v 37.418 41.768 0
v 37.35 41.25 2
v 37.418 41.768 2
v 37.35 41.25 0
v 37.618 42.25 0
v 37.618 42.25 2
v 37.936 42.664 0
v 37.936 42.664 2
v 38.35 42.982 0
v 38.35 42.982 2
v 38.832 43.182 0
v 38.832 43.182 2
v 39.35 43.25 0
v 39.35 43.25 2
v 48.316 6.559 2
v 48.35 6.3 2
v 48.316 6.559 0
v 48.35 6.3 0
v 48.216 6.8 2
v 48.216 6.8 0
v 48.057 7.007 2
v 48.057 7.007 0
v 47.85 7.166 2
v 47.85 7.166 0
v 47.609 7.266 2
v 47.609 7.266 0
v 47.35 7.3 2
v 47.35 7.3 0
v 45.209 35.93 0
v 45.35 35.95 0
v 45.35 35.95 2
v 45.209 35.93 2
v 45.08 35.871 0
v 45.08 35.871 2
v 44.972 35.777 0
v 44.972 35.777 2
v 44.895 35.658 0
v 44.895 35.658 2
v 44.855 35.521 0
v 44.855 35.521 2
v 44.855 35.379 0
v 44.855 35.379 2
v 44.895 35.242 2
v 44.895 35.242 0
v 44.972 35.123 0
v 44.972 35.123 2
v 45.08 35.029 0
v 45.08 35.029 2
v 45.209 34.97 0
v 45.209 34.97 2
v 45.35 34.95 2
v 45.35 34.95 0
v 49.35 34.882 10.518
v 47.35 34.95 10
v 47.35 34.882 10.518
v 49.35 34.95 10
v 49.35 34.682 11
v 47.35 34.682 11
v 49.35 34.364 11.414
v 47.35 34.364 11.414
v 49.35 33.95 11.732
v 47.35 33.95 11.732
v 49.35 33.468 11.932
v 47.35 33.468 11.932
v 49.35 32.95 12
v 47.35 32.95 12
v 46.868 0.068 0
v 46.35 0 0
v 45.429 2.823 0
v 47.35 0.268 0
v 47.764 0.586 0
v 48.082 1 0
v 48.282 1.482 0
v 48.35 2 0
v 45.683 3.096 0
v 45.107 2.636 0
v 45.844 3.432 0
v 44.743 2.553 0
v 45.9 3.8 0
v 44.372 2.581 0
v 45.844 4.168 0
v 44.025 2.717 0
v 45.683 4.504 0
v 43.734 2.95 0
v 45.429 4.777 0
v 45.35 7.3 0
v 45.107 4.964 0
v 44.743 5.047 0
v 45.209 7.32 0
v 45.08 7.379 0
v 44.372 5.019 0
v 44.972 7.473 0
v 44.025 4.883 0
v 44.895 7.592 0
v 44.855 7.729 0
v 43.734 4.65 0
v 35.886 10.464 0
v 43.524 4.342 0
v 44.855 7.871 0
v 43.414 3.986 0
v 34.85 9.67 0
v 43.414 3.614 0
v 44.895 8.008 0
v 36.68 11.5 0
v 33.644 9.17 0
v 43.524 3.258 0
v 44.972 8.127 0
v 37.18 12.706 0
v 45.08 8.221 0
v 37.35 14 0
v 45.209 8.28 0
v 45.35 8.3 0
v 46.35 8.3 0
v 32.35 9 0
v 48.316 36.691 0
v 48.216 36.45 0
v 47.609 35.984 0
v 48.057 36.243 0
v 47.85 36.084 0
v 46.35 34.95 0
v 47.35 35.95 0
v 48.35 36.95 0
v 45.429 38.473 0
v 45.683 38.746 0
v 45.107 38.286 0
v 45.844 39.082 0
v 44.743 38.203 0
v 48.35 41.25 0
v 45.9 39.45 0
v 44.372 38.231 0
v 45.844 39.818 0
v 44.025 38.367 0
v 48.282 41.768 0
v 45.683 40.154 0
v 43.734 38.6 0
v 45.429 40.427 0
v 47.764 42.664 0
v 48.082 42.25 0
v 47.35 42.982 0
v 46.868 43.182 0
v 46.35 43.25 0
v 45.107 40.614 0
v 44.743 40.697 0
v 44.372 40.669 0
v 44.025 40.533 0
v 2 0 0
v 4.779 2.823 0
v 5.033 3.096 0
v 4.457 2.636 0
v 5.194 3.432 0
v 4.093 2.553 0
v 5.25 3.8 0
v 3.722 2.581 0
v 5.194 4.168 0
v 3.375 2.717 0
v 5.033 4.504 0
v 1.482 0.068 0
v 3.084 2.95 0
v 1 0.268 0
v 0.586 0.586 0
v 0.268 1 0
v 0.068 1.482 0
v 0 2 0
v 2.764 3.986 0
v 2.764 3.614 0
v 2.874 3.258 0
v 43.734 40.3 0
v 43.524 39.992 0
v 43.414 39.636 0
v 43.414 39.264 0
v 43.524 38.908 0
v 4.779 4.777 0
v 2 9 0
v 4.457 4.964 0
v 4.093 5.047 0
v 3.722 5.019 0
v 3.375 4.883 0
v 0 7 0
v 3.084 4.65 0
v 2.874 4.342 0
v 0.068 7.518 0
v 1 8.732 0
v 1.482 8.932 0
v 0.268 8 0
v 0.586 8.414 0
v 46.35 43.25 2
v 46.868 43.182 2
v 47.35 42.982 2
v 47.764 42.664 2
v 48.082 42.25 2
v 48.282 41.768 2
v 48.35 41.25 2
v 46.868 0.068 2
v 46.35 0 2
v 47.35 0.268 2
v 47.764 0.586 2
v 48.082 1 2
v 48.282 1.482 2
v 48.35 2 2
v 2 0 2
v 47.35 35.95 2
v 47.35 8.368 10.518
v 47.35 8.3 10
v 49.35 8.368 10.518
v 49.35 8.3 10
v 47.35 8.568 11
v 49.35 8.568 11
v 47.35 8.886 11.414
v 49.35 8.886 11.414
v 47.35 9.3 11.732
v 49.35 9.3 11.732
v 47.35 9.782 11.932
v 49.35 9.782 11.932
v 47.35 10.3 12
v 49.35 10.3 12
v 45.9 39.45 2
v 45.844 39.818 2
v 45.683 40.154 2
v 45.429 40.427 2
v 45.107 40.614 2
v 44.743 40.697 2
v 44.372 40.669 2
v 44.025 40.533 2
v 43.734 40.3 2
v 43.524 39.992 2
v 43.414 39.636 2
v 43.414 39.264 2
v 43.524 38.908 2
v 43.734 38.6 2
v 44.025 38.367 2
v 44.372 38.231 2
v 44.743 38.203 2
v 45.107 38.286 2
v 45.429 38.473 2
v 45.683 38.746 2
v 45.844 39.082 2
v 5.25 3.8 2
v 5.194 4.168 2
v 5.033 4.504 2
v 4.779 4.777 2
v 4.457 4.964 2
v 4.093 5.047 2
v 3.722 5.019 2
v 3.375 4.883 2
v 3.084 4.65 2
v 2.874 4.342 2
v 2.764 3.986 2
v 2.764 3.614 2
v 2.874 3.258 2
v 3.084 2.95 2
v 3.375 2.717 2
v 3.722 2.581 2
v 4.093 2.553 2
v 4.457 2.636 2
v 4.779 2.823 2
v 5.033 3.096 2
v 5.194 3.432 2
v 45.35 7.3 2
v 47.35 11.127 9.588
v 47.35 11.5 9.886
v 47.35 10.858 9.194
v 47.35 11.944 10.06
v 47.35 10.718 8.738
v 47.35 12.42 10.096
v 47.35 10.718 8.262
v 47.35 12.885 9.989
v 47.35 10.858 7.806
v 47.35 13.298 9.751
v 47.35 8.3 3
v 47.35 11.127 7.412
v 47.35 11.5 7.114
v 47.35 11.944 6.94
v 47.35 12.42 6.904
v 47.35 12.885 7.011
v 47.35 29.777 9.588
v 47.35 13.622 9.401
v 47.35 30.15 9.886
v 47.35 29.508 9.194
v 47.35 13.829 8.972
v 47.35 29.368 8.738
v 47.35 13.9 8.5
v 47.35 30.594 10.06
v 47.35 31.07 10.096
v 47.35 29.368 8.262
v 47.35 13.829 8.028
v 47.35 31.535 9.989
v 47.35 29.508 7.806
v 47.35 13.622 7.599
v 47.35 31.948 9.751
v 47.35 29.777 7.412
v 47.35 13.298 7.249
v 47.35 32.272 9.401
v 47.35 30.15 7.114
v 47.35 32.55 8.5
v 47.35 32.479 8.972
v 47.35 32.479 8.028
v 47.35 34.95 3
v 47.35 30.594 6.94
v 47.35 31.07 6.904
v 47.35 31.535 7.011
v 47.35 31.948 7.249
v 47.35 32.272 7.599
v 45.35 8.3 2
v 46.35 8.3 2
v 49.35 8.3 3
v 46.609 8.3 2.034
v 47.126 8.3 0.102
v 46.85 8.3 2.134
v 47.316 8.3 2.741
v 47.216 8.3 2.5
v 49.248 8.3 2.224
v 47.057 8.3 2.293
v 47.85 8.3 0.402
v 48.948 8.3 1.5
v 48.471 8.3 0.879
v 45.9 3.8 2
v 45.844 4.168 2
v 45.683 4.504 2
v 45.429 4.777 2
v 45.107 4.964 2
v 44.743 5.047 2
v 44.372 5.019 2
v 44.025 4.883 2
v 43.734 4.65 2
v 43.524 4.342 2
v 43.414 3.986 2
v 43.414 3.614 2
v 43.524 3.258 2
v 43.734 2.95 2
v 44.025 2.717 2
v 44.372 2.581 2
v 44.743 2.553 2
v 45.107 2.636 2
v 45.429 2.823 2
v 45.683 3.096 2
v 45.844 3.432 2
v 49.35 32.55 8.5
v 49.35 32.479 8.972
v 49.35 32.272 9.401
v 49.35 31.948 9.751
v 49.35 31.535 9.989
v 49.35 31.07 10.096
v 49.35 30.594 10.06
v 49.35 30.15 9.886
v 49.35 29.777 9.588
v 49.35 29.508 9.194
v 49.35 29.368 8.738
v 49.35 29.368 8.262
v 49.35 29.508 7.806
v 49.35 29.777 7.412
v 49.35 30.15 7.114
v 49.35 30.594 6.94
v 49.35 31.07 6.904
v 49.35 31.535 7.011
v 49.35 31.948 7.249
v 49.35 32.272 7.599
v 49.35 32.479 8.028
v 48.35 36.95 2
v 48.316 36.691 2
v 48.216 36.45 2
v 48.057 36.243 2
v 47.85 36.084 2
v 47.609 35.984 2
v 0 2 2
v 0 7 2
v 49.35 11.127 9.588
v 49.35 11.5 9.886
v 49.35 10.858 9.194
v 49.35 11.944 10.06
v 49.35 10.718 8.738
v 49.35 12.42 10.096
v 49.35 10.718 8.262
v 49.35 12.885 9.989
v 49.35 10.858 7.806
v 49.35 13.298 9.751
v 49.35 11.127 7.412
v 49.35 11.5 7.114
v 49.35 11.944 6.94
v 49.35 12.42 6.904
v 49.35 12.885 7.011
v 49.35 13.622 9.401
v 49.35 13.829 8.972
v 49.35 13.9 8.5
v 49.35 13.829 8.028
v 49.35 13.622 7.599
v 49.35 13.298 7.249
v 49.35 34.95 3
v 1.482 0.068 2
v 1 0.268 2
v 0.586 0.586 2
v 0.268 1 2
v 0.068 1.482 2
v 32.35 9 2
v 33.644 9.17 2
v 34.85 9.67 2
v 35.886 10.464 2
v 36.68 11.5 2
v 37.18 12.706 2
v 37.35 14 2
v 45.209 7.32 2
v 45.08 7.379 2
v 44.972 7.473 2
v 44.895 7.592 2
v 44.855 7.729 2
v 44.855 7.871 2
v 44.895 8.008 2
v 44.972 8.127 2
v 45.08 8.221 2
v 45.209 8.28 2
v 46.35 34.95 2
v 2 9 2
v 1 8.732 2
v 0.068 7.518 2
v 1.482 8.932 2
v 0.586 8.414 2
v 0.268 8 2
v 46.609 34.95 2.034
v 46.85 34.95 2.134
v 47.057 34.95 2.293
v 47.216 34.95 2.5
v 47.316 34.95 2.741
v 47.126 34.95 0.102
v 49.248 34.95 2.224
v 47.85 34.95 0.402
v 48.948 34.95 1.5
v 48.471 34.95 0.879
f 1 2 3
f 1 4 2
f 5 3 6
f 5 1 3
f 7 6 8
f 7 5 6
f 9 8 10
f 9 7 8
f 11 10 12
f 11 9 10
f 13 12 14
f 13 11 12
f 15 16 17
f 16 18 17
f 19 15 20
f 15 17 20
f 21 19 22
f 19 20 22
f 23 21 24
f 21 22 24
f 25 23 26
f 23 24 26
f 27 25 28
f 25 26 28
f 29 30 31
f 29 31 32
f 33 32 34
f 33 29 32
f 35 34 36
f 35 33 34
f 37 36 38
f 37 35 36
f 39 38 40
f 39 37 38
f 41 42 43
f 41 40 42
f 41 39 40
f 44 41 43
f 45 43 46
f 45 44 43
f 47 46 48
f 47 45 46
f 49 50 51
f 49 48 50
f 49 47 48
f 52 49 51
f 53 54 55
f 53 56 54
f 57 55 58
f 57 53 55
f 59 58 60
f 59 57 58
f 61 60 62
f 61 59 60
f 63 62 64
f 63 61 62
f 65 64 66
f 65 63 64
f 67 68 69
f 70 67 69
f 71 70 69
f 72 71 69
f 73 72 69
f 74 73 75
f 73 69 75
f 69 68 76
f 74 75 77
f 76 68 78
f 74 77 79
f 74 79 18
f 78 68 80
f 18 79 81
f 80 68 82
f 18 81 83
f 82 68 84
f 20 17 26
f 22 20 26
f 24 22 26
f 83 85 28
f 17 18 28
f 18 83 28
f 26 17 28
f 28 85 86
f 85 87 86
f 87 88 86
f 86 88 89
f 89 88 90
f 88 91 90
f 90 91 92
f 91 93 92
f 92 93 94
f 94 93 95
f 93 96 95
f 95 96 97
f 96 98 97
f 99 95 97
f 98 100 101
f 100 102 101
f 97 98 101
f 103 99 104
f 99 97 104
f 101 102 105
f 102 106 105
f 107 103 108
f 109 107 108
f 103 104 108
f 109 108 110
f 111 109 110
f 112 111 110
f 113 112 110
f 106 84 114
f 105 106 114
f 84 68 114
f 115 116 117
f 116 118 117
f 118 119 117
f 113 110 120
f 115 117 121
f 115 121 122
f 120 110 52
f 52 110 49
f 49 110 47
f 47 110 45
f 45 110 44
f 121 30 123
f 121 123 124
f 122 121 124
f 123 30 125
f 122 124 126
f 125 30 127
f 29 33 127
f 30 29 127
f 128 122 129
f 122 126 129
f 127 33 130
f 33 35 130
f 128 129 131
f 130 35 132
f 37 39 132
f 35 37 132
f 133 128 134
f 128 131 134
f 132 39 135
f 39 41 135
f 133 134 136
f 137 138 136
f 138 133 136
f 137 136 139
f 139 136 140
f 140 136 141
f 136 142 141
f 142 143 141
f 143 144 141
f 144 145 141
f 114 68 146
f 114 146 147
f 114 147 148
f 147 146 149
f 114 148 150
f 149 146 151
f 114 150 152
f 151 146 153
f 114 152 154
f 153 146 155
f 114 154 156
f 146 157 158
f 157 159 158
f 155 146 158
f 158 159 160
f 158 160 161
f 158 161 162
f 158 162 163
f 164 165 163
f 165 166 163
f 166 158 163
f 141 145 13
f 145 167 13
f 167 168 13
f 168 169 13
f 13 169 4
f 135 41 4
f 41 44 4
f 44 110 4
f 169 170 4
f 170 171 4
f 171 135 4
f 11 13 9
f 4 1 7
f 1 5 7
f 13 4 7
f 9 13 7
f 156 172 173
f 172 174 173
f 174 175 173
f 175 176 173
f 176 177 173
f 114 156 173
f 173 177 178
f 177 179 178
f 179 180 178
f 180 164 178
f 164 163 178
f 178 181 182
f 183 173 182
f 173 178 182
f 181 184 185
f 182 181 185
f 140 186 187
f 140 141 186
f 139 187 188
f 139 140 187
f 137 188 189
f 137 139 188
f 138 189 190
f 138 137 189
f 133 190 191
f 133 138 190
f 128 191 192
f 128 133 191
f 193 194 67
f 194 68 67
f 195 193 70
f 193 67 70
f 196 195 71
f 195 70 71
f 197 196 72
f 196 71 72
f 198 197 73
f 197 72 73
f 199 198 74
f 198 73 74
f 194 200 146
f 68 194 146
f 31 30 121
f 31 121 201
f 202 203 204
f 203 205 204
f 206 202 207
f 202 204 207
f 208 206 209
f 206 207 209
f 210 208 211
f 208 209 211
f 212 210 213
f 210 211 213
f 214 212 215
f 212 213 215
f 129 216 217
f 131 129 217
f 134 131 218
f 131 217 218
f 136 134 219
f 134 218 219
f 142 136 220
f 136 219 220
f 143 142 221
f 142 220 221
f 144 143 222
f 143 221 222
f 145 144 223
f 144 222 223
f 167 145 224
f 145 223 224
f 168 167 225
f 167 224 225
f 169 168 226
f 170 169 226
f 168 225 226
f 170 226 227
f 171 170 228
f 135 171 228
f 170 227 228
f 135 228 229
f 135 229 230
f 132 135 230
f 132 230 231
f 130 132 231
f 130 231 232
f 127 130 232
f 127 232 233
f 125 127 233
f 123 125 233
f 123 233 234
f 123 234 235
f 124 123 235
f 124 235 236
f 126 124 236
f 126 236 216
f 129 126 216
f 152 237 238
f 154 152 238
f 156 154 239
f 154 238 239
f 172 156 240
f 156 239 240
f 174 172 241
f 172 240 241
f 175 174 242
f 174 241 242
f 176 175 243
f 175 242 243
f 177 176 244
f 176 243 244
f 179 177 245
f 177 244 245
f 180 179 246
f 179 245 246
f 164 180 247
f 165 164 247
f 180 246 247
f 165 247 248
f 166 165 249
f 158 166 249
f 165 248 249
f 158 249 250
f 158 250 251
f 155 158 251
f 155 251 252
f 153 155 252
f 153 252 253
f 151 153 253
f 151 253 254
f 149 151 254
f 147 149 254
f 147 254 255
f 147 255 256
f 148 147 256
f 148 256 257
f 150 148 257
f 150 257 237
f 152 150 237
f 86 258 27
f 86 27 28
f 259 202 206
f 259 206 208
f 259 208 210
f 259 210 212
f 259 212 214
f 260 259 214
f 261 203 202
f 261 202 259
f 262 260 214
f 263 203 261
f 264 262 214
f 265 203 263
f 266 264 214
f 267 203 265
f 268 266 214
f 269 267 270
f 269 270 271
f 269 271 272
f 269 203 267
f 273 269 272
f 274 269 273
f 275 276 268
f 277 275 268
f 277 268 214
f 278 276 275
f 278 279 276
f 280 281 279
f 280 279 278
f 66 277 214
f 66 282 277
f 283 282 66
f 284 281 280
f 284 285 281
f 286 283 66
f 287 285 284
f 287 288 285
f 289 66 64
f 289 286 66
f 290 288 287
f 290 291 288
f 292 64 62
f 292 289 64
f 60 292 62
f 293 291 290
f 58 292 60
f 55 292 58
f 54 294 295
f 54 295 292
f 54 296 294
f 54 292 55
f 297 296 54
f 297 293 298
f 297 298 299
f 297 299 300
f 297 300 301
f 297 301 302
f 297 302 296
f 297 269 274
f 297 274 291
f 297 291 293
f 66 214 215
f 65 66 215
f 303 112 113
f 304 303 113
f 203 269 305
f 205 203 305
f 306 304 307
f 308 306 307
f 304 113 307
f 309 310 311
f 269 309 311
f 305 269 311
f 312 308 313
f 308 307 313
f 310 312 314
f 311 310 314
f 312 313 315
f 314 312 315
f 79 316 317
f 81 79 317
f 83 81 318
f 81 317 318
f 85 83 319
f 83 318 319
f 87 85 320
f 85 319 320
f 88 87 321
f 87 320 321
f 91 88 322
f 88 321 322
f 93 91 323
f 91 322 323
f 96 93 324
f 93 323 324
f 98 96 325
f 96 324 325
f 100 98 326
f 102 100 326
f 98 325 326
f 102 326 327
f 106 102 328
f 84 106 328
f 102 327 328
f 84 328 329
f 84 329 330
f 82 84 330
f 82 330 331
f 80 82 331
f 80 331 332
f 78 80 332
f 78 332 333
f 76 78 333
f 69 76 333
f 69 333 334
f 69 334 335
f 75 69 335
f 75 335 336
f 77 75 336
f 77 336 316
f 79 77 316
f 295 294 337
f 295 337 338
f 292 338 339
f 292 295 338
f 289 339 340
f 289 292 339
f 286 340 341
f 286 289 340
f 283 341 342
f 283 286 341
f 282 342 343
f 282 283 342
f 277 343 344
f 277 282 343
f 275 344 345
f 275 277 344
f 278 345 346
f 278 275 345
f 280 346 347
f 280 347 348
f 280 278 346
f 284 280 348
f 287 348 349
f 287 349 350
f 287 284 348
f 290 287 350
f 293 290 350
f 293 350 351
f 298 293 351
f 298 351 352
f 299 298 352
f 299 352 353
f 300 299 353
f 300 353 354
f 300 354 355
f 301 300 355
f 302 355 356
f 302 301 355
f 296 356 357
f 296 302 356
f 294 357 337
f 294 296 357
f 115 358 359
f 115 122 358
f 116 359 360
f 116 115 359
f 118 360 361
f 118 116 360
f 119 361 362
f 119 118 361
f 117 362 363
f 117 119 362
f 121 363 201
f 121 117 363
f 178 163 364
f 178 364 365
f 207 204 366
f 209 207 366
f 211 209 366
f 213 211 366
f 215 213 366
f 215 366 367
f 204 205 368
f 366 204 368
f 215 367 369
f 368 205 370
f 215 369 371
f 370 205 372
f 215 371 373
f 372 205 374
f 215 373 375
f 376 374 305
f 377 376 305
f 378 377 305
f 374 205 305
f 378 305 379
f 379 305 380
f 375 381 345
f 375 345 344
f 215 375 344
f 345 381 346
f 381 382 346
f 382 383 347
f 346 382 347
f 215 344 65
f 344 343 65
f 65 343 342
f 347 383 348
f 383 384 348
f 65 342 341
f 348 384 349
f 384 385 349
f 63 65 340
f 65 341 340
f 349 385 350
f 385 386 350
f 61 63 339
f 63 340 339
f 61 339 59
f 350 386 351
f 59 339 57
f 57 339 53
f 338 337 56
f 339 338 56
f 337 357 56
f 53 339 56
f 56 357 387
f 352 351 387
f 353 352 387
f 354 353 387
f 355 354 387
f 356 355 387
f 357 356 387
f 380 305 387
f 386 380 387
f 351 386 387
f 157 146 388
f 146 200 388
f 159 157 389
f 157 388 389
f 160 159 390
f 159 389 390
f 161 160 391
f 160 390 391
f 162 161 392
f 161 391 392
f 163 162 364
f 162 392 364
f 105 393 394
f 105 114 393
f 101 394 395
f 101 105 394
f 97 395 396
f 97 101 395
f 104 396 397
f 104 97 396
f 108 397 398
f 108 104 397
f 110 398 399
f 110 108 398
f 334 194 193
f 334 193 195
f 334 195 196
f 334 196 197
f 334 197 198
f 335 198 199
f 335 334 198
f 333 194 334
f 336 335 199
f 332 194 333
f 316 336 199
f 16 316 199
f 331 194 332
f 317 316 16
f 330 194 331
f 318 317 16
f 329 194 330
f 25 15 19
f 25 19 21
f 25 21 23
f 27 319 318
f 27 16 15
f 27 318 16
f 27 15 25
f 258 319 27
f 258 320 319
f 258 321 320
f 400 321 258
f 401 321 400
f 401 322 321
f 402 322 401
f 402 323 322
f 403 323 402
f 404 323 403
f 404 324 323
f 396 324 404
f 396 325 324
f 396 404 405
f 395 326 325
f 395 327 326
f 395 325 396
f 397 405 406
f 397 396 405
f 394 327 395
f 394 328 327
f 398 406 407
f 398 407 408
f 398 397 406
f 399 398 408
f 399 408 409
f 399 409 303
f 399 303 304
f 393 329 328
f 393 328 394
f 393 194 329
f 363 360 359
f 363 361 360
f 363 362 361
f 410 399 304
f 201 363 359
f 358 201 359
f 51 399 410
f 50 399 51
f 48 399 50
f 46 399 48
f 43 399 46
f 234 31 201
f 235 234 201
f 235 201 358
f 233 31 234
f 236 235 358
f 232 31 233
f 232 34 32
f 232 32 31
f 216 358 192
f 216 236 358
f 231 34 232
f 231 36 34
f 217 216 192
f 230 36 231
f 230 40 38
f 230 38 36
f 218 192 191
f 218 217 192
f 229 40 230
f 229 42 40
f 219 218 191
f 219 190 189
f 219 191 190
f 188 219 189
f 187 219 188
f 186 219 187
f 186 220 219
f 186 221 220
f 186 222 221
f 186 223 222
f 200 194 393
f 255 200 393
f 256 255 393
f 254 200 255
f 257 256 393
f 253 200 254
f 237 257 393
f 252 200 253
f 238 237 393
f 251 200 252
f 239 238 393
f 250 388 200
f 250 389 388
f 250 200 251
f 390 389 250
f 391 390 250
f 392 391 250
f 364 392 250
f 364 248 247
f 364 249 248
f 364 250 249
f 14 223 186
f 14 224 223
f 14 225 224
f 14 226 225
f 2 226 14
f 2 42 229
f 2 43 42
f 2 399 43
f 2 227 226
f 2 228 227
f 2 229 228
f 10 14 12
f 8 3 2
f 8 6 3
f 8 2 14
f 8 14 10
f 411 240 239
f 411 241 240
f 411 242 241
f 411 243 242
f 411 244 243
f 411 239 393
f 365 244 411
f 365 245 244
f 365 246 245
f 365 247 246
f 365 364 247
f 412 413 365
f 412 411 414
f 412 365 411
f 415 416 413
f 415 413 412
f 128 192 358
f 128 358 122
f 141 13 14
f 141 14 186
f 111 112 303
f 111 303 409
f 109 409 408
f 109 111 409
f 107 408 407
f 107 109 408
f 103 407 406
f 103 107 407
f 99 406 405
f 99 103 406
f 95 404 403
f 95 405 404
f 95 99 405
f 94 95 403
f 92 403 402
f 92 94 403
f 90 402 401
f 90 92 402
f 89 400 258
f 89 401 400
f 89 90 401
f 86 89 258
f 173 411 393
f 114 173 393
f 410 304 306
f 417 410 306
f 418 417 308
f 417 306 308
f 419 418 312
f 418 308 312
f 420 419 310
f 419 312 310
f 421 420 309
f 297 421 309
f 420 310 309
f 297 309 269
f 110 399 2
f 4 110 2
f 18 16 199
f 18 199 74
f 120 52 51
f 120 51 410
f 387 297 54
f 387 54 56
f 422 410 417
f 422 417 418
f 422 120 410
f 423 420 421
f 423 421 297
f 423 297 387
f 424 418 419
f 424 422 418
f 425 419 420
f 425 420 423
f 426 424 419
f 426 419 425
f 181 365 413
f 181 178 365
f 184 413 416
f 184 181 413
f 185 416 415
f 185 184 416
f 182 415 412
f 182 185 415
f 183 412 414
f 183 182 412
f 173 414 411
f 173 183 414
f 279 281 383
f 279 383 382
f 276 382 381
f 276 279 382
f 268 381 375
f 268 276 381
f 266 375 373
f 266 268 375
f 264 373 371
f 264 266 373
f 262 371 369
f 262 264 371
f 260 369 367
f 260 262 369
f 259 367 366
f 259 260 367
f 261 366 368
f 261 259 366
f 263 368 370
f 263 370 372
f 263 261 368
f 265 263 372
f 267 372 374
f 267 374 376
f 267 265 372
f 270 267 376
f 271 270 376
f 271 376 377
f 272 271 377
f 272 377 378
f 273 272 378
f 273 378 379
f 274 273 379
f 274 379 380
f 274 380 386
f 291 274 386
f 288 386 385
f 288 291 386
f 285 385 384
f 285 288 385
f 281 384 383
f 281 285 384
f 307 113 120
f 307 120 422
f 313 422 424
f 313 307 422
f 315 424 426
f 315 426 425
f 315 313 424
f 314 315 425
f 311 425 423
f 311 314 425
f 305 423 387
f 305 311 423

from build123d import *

# Parameters (mm, degrees)
SKETCH1_W                 = 47.35
SKETCH1_H                 = 43.25
BOSS_EXTRUDE2_DEPTH       = 2
EDGE_FLANGE1_START        = -2
EDGE_FLANGE1_OUTLINE_W    = 1
EDGE_FLANGE1_OUTLINE_H    = 2
EDGE_FLANGE1_DEPTH        = 2
EDGE_FLANGE1_START_2      = -1
EDGE_FLANGE1_2_DEPTH      = 3.69178
EDGE_FLANGE1_3_OUTLINE_W  = 2
EDGE_FLANGE1_3_OUTLINE_H  = 26.65
EDGE_FLANGE1_3_DEPTH      = 12
EDGE_FLANGE1_START_3      = 8.3
EDGE_FLANGE1_4_DEPTH      = 26.65
EDGE_FLANGE1_5_DEPTH      = 26.65
EDGE_FLANGE1_START_4      = 47.35
EDGE_FLANGE1_6_OUTLINE_R  = 1.6
EDGE_FLANGE1_6_DEPTH      = 2
REDONDEO1_R               = 2
TALADRO_ROSCADO_M31_D     = 2.5
TALADRO_ROSCADO_M31_DEPTH = 8.5
TALADRO_ROSCADO_M31_TIP   = 0.751075774
CROQUIS4_W                = 37.35
CROQUIS4_H                = 34.25
CORTAR_EXTRUIR1_DEPTH     = 67.377594111
CROQUIS14_W               = 2
CROQUIS14_H               = 7.3
SALIENTE_EXTRUIR1_DEPTH   = 1
FILLET1_R                 = 2
REDONDEO2_R               = 5
REDONDEO3_R               = 1


with BuildPart() as part:
    # Sketch1 → Boss-Extrude2 (new body)
    with BuildSketch(Plane.XY):
        with Locations((23.675, 21.625)):
            Rectangle(SKETCH1_W, SKETCH1_H)
    extrude(amount=BOSS_EXTRUDE2_DEPTH)

    # Edge-Flange1: read off the stored shape, not the designer's step
    # Edge-Flange1 outline → Edge-Flange1 (cut)
    with BuildSketch(Plane(origin=(47.35, 0, 2), x_dir=(0, 1, 0), z_dir=(1, 0, 0)).offset(EDGE_FLANGE1_START)):
        with Locations((35.45, -1)):
            Rectangle(EDGE_FLANGE1_OUTLINE_W, EDGE_FLANGE1_OUTLINE_H)
        with Locations((7.8, -1)):
            Rectangle(EDGE_FLANGE1_OUTLINE_W, EDGE_FLANGE1_OUTLINE_H)
    extrude(amount=EDGE_FLANGE1_DEPTH, mode=Mode.SUBTRACT)

    # Edge-Flange1 2 outline → Edge-Flange1 2 (cut)
    with BuildSketch(Plane.XY.offset(EDGE_FLANGE1_START_2)):
        with BuildLine():
            ThreePointArc((45.35, 35.95), (44.85, 35.45), (45.35, 34.95))
            Line((45.35, 34.95), (45.35, 35.95))
        make_face()
        with BuildLine():
            ThreePointArc((45.35, 8.3), (44.85, 7.8), (45.35, 7.3))
            Line((45.35, 7.3), (45.35, 8.3))
        make_face()
    extrude(amount=EDGE_FLANGE1_2_DEPTH, mode=Mode.SUBTRACT)

    # Edge-Flange1 3 outline → Edge-Flange1 3 (add)
    with BuildSketch(Plane.XY):
        with Locations((48.35, 21.625)):
            Rectangle(EDGE_FLANGE1_3_OUTLINE_W, EDGE_FLANGE1_3_OUTLINE_H)
    extrude(amount=EDGE_FLANGE1_3_DEPTH)

    # Edge-Flange1 4 outline → Edge-Flange1 4 (add)
    with BuildSketch(Plane(origin=(0, 0, 0), x_dir=(1, 0, 0), z_dir=(0, 1, 0)).offset(EDGE_FLANGE1_START_3)):
        with BuildLine():
            ThreePointArc((46.35, -2), (47.057106781, -2.292893219), (47.35, -3))
            Line((47.35, -3), (47.35, -2))
            Line((47.35, -2), (46.35, -2))
        make_face()
    extrude(amount=EDGE_FLANGE1_4_DEPTH)

    # Edge-Flange1 5 outline → Edge-Flange1 5 (cut)
    with BuildSketch(Plane(origin=(0, 0, 0), x_dir=(1, 0, 0), z_dir=(0, 1, 0)).offset(EDGE_FLANGE1_START_3)):
        with BuildLine():
            ThreePointArc((46.35, 0), (48.471320344, -0.878679656), (49.35, -3))
            Line((49.35, -3), (49.35, 0))
            Line((49.35, 0), (46.35, 0))
        make_face()
    extrude(amount=EDGE_FLANGE1_5_DEPTH, mode=Mode.SUBTRACT)

    # Edge-Flange1 6 outline → Edge-Flange1 6 (cut)
    with BuildSketch(Plane.YZ.offset(EDGE_FLANGE1_START_4)):
        with Locations((12.3, 8.5)):
            Circle(EDGE_FLANGE1_6_OUTLINE_R)
        with Locations((30.95, 8.5)):
            Circle(EDGE_FLANGE1_6_OUTLINE_R)
    extrude(amount=EDGE_FLANGE1_6_DEPTH, mode=Mode.SUBTRACT)

    # Redondeo1
    redondeo1_edges = [part.edges().sort_by_distance(p)[0] for p in [
        (48.35, 8.3, 12),
        (48.35, 34.95, 12),
    ]]
    fillet(redondeo1_edges, radius=REDONDEO1_R)

    # Taladro roscado M31
    with Locations(Plane(origin=(0, 0, 0), x_dir=(-1, 0, 0), z_dir=(0, 0, -1))):
        with Locations((-44.65, 39.45), (-4, 3.8), (-44.65, 3.8)):
            Hole(TALADRO_ROSCADO_M31_D / 2, depth=TALADRO_ROSCADO_M31_DEPTH)
            with Locations((0, 0, -(TALADRO_ROSCADO_M31_DEPTH + TALADRO_ROSCADO_M31_TIP / 2))):  # 118° drill point
                Cone(0, TALADRO_ROSCADO_M31_D / 2, TALADRO_ROSCADO_M31_TIP, mode=Mode.SUBTRACT)

    # Croquis4 → Cortar-Extruir1 (cut, through all)
    with BuildSketch(Plane.XY.offset(2)):
        with Locations((18.675, 26.125)):
            Rectangle(CROQUIS4_W, CROQUIS4_H)
    extrude(amount=-CORTAR_EXTRUIR1_DEPTH, mode=Mode.SUBTRACT)

    # Croquis14 → Saliente-Extruir1 (add)
    with BuildSketch(Plane(origin=(47.35, 0, 0), x_dir=(0, 0, -1), z_dir=(1, 0, 0))):
        with Locations((-1, 3.65)):
            Rectangle(CROQUIS14_W, CROQUIS14_H)
        with Locations((-1, 39.6)):
            Rectangle(CROQUIS14_W, CROQUIS14_H)
    extrude(amount=SALIENTE_EXTRUIR1_DEPTH)

    # Fillet1
    fillet1_edges = [part.edges().sort_by_distance(p)[0] for p in [
        (0, 9, 1),
        (37.35, 43.25, 1),
        (48.35, 0, 1),
        (48.35, 43.25, 1),
        (0, 0, 1),
    ]]
    fillet(fillet1_edges, radius=FILLET1_R)

    # Redondeo2
    redondeo2_edges = [part.edges().sort_by_distance(p)[0] for p in [
        (37.35, 9, 1),
    ]]
    fillet(redondeo2_edges, radius=REDONDEO2_R)

    # Redondeo3
    redondeo3_edges = [part.edges().sort_by_distance(p)[0] for p in [
        (48.35, 7.3, 1),
        (48.35, 35.95, 1),
    ]]
    fillet(redondeo3_edges, radius=REDONDEO3_R)


solid = part.part
